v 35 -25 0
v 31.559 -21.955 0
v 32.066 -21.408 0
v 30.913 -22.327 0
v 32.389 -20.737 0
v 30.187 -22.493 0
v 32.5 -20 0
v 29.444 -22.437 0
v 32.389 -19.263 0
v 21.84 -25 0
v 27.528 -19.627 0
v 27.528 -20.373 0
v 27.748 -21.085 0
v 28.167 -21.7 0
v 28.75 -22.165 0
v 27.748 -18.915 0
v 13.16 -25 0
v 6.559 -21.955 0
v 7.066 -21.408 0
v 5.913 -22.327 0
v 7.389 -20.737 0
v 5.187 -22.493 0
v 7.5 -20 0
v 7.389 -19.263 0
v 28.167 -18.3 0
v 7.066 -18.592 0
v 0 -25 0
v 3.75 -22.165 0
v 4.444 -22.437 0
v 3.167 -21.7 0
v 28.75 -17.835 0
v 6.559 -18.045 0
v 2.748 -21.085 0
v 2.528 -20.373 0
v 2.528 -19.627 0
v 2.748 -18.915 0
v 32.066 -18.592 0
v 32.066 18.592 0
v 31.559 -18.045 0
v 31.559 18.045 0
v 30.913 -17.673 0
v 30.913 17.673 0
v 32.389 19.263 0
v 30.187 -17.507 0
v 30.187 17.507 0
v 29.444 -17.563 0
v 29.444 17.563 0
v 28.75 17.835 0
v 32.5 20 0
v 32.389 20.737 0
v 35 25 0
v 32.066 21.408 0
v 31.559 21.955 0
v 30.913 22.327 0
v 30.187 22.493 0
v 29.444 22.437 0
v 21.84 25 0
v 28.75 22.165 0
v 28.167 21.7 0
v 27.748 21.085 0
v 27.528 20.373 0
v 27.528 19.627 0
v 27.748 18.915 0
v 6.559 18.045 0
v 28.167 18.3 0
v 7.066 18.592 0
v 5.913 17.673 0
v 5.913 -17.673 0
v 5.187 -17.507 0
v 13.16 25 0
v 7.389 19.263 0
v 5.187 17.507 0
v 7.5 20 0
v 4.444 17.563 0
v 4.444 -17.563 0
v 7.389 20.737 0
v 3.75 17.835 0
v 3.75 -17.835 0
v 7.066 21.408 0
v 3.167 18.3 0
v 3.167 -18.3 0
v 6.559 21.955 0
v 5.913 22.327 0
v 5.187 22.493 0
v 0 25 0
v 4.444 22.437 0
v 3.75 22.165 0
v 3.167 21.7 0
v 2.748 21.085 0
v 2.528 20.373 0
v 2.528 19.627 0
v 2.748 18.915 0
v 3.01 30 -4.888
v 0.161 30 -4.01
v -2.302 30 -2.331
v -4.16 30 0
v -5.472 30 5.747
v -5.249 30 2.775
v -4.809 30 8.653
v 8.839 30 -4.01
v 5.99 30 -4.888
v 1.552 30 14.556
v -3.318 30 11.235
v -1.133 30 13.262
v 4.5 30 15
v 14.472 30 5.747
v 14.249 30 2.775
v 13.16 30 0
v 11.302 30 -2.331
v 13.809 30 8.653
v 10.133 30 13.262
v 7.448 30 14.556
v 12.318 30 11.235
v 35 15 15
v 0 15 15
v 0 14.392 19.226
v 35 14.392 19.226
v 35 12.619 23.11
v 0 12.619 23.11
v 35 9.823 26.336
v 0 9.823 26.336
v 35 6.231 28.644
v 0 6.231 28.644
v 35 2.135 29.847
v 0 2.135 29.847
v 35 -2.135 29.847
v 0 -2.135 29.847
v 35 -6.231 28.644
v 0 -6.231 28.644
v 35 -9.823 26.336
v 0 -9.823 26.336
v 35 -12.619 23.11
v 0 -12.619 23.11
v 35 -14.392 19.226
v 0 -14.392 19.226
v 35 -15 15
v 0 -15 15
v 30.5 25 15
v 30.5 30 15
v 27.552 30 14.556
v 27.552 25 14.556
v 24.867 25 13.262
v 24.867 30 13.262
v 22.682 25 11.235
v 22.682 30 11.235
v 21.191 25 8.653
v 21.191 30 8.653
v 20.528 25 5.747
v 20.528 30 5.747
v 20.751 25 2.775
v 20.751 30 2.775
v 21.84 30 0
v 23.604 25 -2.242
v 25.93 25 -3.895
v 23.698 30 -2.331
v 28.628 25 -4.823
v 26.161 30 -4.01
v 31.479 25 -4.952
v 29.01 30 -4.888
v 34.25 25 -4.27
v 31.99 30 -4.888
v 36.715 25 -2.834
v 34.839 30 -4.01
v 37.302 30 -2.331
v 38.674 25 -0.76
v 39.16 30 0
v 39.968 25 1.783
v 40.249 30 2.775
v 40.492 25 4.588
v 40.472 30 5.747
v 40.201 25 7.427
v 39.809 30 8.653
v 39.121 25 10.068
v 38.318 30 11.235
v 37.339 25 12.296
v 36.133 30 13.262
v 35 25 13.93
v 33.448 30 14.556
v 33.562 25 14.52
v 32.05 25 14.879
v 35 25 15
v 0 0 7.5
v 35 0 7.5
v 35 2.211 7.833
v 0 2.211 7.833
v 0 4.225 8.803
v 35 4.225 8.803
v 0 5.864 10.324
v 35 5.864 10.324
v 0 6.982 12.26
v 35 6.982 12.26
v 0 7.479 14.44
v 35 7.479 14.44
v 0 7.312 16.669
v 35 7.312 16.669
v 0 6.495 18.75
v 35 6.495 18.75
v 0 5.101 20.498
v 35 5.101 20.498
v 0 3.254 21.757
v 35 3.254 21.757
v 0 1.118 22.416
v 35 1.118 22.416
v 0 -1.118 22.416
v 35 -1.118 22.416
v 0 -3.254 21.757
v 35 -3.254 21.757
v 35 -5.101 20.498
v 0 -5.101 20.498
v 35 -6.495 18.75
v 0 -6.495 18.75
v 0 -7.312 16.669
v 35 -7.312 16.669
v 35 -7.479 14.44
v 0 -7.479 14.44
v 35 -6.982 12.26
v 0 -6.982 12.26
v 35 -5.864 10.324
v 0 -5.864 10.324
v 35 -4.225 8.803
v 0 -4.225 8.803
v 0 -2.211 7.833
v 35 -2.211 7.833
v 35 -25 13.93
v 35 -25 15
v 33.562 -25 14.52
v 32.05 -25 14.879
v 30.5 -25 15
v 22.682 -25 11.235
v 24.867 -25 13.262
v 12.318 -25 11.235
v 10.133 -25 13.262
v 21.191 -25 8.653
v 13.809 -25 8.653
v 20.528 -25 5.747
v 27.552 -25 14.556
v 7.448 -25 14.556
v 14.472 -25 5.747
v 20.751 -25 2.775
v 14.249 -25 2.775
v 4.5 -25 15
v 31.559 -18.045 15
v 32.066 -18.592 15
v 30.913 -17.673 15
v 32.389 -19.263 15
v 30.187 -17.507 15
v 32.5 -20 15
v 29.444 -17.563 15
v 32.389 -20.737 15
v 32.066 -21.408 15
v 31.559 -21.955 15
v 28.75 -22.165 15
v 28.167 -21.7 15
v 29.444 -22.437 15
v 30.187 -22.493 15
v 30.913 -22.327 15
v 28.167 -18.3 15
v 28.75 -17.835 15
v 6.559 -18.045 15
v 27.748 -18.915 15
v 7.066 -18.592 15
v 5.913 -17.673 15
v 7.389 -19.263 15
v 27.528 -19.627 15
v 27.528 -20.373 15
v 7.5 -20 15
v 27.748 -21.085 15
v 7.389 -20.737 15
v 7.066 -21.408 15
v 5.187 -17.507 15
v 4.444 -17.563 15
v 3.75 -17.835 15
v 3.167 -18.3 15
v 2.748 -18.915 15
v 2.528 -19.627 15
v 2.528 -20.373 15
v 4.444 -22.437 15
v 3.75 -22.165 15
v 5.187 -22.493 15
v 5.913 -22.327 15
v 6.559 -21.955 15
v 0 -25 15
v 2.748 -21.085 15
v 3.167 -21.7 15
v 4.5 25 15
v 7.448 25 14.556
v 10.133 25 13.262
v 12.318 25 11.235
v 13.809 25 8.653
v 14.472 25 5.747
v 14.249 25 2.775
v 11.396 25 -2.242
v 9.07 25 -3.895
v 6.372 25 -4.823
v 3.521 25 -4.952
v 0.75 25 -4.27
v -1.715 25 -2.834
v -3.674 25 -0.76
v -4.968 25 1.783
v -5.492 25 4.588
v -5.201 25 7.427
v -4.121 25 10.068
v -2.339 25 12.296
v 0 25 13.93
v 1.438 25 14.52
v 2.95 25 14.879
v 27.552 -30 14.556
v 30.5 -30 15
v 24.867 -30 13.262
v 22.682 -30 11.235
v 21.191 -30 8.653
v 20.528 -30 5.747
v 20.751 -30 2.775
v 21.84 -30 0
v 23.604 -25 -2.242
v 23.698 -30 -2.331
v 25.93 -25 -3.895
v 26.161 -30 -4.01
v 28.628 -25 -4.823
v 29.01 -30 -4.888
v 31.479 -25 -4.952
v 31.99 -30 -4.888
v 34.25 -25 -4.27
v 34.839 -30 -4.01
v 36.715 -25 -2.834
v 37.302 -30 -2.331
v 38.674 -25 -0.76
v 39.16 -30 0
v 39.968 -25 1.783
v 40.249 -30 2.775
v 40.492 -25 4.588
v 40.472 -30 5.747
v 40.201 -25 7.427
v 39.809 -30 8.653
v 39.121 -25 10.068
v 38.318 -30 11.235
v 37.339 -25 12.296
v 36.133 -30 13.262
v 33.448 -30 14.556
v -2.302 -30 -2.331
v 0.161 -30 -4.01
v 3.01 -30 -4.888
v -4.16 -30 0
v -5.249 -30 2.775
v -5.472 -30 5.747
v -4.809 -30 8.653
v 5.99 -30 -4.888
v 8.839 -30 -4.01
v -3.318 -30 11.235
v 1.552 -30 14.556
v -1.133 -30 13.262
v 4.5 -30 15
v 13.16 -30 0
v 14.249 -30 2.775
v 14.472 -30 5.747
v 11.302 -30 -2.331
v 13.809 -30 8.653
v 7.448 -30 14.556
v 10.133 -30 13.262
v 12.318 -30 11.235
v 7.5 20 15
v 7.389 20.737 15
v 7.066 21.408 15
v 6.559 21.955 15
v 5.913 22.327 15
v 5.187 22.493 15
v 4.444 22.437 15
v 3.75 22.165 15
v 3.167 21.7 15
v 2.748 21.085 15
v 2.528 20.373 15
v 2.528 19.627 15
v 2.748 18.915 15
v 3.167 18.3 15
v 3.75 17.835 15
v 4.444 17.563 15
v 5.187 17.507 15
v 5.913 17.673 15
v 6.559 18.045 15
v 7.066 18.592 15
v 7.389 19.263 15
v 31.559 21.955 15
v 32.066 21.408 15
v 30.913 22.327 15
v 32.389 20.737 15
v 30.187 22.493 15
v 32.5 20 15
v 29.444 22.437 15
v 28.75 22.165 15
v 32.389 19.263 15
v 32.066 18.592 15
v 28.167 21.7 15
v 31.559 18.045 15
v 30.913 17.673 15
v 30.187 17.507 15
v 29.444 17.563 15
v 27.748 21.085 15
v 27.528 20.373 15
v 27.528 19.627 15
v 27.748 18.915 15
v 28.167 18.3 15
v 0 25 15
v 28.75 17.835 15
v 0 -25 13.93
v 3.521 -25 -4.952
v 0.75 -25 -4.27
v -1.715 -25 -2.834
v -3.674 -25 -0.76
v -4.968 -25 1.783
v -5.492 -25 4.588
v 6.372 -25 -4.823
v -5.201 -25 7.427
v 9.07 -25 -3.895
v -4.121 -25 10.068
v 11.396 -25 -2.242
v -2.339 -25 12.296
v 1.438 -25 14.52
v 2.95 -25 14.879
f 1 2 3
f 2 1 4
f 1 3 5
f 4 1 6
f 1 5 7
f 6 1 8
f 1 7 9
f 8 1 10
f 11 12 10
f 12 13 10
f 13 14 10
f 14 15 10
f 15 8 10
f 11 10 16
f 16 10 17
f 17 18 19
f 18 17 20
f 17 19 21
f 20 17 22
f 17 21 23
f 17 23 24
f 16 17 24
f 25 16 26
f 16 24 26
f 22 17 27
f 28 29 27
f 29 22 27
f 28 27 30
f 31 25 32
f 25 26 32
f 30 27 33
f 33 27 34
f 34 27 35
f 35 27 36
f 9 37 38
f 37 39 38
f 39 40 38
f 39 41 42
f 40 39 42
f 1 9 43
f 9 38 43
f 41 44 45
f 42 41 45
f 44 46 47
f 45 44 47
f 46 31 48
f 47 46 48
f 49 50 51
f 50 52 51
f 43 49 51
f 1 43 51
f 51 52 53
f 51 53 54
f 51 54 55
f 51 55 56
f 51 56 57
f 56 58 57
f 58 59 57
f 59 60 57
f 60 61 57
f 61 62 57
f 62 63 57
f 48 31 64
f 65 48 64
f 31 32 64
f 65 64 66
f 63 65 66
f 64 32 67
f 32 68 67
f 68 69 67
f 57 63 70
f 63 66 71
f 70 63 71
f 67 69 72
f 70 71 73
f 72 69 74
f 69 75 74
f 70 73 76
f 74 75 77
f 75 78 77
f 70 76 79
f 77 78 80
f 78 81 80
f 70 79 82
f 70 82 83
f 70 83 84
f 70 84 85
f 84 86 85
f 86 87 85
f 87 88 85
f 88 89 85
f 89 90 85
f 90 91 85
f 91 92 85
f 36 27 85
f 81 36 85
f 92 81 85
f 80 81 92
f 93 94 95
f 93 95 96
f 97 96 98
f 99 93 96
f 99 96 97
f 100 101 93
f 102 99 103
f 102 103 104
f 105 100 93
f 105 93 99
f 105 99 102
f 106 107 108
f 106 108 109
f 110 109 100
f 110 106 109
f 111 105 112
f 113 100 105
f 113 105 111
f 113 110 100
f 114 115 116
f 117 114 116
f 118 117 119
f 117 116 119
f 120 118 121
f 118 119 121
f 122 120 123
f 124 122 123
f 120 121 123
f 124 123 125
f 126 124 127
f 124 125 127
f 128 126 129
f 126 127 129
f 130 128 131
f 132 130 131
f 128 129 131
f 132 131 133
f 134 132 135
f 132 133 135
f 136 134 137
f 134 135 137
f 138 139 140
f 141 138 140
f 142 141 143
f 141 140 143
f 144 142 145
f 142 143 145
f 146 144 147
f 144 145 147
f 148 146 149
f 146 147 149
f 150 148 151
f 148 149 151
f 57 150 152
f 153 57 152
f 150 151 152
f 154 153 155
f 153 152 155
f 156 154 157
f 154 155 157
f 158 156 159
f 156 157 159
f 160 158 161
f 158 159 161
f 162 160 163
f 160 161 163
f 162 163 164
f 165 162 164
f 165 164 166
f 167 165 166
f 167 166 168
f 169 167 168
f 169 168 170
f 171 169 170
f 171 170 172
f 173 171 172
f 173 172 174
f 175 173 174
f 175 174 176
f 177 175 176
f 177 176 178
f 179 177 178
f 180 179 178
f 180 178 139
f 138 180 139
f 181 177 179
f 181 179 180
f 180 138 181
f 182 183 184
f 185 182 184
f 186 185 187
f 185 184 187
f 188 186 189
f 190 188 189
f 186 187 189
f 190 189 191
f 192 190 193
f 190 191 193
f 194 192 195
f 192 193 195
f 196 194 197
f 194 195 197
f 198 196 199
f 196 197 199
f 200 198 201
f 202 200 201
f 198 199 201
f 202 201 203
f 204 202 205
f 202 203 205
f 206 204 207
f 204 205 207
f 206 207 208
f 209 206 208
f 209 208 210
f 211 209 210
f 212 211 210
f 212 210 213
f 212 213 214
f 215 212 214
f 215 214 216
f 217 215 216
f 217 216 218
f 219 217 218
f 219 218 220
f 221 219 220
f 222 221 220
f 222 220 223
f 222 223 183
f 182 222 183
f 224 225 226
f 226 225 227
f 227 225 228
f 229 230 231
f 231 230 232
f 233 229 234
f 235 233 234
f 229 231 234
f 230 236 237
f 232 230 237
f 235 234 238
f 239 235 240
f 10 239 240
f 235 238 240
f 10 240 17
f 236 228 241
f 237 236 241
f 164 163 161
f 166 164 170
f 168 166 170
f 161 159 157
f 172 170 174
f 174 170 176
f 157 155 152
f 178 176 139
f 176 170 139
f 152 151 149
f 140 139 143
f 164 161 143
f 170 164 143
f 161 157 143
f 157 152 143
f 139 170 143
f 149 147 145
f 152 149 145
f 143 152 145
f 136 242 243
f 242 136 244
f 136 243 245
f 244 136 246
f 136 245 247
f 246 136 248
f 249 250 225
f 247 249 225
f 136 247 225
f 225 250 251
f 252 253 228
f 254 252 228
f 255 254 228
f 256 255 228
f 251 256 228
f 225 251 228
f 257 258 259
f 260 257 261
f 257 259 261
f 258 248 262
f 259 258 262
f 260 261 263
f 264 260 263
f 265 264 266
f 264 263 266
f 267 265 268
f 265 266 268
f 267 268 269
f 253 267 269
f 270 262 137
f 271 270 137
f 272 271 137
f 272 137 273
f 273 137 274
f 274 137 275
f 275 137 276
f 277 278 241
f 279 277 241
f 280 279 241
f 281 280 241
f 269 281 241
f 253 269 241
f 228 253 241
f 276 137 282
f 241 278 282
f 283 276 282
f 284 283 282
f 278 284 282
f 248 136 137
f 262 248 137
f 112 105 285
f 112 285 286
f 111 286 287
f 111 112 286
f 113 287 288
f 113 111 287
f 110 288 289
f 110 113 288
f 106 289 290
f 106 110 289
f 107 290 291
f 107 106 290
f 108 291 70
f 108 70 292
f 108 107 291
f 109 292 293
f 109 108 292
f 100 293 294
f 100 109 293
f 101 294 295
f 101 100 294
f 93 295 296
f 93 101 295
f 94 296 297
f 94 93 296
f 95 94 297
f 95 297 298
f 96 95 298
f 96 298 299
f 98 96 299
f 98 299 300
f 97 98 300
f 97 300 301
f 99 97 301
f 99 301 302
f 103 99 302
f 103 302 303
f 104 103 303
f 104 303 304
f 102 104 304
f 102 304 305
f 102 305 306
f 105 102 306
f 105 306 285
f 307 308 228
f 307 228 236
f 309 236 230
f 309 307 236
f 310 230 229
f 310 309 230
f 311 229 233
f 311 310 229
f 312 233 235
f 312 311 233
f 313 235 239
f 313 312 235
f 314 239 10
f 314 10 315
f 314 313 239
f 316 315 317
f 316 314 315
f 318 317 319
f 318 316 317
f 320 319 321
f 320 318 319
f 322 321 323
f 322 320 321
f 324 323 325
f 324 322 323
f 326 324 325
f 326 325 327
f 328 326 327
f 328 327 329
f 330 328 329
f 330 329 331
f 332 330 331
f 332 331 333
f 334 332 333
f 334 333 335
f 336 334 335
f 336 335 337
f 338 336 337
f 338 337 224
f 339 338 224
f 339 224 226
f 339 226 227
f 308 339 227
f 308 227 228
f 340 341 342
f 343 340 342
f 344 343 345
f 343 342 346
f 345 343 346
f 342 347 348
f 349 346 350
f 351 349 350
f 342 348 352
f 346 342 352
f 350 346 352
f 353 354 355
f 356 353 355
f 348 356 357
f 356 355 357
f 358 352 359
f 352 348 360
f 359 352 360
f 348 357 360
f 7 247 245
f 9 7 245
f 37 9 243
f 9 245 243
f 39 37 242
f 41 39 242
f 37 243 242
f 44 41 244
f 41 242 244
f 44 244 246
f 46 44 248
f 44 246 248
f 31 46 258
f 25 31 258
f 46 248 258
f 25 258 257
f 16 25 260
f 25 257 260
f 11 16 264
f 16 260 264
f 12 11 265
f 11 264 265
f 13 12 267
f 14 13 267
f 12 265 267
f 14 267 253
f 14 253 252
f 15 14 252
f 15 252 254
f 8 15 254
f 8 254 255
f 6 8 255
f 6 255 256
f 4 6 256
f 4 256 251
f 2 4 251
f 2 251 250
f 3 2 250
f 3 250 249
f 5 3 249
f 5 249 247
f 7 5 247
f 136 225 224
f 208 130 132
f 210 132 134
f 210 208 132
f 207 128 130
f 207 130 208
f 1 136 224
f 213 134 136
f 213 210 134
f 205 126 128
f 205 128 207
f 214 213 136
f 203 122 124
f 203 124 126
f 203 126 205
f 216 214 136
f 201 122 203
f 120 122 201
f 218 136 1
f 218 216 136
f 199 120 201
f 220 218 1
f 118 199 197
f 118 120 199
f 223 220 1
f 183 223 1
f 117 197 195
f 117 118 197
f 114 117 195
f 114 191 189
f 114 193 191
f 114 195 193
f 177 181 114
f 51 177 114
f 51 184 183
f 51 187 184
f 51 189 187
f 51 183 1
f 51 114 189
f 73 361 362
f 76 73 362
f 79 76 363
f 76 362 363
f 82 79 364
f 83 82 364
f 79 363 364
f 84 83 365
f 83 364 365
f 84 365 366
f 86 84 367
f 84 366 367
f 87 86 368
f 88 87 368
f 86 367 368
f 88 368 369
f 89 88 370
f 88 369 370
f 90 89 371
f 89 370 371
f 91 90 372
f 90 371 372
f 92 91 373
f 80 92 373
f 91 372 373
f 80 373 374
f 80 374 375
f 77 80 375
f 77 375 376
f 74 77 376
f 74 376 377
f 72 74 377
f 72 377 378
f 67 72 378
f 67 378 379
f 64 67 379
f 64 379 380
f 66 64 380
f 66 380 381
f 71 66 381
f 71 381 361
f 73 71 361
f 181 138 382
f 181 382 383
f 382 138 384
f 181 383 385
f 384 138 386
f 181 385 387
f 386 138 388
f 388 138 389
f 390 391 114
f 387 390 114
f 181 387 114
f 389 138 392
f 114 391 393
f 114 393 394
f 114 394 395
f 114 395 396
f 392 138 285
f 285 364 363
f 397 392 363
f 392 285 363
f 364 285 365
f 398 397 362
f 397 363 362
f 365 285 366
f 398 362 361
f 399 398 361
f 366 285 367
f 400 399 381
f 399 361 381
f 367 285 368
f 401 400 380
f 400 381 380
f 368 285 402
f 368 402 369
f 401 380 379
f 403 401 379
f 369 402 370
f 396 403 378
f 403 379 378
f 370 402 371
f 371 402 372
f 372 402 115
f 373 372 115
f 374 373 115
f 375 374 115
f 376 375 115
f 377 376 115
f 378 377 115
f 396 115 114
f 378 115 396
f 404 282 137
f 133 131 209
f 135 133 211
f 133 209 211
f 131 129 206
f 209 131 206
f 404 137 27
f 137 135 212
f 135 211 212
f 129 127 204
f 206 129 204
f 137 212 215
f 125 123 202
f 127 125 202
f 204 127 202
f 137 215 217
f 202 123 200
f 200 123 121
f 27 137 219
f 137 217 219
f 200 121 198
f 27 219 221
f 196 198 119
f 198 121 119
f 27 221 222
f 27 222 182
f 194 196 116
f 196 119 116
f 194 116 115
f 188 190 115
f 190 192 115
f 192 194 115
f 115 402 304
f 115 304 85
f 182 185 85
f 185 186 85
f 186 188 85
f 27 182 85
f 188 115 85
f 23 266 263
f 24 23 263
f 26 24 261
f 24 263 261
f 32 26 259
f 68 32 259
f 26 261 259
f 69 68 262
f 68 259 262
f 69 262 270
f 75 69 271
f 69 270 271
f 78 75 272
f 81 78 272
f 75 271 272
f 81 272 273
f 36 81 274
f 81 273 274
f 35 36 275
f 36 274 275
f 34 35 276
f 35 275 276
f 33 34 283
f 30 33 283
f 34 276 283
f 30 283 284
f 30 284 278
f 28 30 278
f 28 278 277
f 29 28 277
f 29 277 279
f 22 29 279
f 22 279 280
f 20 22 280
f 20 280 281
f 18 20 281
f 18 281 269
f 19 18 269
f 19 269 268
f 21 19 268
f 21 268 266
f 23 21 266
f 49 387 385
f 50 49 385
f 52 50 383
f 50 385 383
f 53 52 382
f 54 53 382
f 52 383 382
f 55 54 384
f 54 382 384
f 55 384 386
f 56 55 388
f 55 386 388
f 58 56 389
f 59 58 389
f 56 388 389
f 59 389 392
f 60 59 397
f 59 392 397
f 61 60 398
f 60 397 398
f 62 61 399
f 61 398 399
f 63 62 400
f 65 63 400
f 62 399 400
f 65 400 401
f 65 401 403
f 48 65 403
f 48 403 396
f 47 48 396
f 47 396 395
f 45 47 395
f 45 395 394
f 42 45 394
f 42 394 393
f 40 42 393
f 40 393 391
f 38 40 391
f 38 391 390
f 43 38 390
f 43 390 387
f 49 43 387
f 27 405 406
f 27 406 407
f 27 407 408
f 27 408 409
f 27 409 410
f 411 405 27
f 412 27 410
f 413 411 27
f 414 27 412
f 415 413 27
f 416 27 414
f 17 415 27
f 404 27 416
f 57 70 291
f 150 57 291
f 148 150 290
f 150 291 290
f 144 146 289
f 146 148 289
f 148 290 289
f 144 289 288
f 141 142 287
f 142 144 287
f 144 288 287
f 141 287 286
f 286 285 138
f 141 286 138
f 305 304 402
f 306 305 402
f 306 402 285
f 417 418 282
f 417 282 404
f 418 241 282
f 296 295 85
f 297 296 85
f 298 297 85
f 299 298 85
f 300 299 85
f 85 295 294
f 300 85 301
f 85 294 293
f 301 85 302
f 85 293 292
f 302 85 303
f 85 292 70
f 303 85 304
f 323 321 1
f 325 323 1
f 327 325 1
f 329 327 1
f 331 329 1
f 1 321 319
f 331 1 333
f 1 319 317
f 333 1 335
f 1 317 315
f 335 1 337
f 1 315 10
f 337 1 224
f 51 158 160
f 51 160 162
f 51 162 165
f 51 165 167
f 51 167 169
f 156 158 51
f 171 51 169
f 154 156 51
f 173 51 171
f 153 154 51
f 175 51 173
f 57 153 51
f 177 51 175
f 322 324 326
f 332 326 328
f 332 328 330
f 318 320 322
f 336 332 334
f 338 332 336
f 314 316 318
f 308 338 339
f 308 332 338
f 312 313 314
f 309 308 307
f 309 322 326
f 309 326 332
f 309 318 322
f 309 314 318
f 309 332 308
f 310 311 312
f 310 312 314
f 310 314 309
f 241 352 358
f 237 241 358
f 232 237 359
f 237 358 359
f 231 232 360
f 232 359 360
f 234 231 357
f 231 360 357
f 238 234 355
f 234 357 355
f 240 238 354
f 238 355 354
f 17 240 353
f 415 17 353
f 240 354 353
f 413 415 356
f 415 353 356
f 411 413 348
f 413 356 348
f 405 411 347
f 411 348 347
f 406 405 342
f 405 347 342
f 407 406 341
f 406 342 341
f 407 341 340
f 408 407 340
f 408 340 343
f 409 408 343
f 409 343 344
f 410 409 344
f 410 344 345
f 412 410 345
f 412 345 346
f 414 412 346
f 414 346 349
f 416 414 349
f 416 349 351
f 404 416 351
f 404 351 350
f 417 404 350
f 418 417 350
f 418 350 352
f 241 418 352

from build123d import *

# Parameters (mm, degrees)
BODY_DEPTH              = 35
SKETCH3_R               = 7.5
SHAFT_HOLE_DEPTH        = 40
SKETCH4_R               = 2.5
BOSS_EXTRUDE1_DEPTH     = 5
SKETCH5_R               = 10
BEARING_DEPTH           = 5
MIRROR5_COPY_1_SKETCH_R = 10
MIRROR5_COPY_1_DEPTH    = 5
SKETCH6_R               = 2.5
CUT_EXTRUDE1_DEPTH      = 55.224072145


with BuildPart() as part:
    # Sketch1 → body (new body)
    with BuildSketch(Plane(origin=(0, 0, 0), x_dir=(0, 0, -1), z_dir=(1, 0, 0))):
        with BuildLine():
            Line((-15, -15), (-15, -25))
            Line((-15, -25), (0, -25))
            Line((0, -25), (0, 25))
            Line((0, 25), (-15, 25))
            Line((-15, 25), (-15, 15))
            ThreePointArc((-15, 15), (-30, 0), (-15, -15))
        make_face()
    extrude(amount=BODY_DEPTH)

    # Sketch3 → shaft hole (cut)
    with BuildSketch(Plane(origin=(35, 0, 0), x_dir=(0, 0, -1), z_dir=(1, 0, 0))):
        with Locations((-15, 0)):
            Circle(SKETCH3_R)
    extrude(amount=-SHAFT_HOLE_DEPTH, mode=Mode.SUBTRACT)

    # Sketch4 → Boss-Extrude1 (add)
    with BuildSketch(Plane(origin=(0, 25, 0), x_dir=(1, 0, 0), z_dir=(0, 1, 0))):
        with Locations(Location((4.5, -5, 0), (0, 0, 90))):
            Circle(SKETCH4_R)
        with Locations(Location((30.5, -5, 0), (0, 0, 90))):
            Circle(SKETCH4_R)
    boss_extrude1 = extrude(amount=BOSS_EXTRUDE1_DEPTH)

    # Mirror1: Boss-Extrude1 across plane
    add(boss_extrude1.mirror(Plane.ZX))

    # Sketch5 → bearing (add)
    with BuildSketch(Plane(origin=(0, 30, 0), x_dir=(1, 0, 0), z_dir=(0, 1, 0))):
        with Locations(Location((4.5, -5, 0), (0, 0, 270))):
            Circle(SKETCH5_R)
    bearing = extrude(amount=-BEARING_DEPTH)

    # Mirror2: bearing across plane
    add(bearing.mirror(Plane.ZX))

    # Mirror5: bearing across plane
    add(bearing.mirror(Plane(origin=(17.5, 0, 0), x_dir=(0, 0, 1), z_dir=(1, 0, 0))))

    # Mirror5 copy 1 sketch → Mirror5 copy 1 (add)
    with BuildSketch(Plane(origin=(35, -30, 0), x_dir=(-1, 0, 0), z_dir=(0, -1, 0))):
        with Locations(Location((4.5, -5, 0), (0, 0, 270))):
            Circle(MIRROR5_COPY_1_SKETCH_R)
    extrude(amount=-MIRROR5_COPY_1_DEPTH)

    # Sketch6 → Cut-Extrude1 (cut, through all)
    with BuildSketch(Plane.XY.offset(15)):
        with Locations((5, 20)):
            Circle(SKETCH6_R)
        with Locations((30, 20)):
            Circle(SKETCH6_R)
        with Locations((30, -20)):
            Circle(SKETCH6_R)
        with Locations((5, -20)):
            Circle(SKETCH6_R)
    extrude(amount=-CUT_EXTRUDE1_DEPTH, mode=Mode.SUBTRACT)


solid = part.part
